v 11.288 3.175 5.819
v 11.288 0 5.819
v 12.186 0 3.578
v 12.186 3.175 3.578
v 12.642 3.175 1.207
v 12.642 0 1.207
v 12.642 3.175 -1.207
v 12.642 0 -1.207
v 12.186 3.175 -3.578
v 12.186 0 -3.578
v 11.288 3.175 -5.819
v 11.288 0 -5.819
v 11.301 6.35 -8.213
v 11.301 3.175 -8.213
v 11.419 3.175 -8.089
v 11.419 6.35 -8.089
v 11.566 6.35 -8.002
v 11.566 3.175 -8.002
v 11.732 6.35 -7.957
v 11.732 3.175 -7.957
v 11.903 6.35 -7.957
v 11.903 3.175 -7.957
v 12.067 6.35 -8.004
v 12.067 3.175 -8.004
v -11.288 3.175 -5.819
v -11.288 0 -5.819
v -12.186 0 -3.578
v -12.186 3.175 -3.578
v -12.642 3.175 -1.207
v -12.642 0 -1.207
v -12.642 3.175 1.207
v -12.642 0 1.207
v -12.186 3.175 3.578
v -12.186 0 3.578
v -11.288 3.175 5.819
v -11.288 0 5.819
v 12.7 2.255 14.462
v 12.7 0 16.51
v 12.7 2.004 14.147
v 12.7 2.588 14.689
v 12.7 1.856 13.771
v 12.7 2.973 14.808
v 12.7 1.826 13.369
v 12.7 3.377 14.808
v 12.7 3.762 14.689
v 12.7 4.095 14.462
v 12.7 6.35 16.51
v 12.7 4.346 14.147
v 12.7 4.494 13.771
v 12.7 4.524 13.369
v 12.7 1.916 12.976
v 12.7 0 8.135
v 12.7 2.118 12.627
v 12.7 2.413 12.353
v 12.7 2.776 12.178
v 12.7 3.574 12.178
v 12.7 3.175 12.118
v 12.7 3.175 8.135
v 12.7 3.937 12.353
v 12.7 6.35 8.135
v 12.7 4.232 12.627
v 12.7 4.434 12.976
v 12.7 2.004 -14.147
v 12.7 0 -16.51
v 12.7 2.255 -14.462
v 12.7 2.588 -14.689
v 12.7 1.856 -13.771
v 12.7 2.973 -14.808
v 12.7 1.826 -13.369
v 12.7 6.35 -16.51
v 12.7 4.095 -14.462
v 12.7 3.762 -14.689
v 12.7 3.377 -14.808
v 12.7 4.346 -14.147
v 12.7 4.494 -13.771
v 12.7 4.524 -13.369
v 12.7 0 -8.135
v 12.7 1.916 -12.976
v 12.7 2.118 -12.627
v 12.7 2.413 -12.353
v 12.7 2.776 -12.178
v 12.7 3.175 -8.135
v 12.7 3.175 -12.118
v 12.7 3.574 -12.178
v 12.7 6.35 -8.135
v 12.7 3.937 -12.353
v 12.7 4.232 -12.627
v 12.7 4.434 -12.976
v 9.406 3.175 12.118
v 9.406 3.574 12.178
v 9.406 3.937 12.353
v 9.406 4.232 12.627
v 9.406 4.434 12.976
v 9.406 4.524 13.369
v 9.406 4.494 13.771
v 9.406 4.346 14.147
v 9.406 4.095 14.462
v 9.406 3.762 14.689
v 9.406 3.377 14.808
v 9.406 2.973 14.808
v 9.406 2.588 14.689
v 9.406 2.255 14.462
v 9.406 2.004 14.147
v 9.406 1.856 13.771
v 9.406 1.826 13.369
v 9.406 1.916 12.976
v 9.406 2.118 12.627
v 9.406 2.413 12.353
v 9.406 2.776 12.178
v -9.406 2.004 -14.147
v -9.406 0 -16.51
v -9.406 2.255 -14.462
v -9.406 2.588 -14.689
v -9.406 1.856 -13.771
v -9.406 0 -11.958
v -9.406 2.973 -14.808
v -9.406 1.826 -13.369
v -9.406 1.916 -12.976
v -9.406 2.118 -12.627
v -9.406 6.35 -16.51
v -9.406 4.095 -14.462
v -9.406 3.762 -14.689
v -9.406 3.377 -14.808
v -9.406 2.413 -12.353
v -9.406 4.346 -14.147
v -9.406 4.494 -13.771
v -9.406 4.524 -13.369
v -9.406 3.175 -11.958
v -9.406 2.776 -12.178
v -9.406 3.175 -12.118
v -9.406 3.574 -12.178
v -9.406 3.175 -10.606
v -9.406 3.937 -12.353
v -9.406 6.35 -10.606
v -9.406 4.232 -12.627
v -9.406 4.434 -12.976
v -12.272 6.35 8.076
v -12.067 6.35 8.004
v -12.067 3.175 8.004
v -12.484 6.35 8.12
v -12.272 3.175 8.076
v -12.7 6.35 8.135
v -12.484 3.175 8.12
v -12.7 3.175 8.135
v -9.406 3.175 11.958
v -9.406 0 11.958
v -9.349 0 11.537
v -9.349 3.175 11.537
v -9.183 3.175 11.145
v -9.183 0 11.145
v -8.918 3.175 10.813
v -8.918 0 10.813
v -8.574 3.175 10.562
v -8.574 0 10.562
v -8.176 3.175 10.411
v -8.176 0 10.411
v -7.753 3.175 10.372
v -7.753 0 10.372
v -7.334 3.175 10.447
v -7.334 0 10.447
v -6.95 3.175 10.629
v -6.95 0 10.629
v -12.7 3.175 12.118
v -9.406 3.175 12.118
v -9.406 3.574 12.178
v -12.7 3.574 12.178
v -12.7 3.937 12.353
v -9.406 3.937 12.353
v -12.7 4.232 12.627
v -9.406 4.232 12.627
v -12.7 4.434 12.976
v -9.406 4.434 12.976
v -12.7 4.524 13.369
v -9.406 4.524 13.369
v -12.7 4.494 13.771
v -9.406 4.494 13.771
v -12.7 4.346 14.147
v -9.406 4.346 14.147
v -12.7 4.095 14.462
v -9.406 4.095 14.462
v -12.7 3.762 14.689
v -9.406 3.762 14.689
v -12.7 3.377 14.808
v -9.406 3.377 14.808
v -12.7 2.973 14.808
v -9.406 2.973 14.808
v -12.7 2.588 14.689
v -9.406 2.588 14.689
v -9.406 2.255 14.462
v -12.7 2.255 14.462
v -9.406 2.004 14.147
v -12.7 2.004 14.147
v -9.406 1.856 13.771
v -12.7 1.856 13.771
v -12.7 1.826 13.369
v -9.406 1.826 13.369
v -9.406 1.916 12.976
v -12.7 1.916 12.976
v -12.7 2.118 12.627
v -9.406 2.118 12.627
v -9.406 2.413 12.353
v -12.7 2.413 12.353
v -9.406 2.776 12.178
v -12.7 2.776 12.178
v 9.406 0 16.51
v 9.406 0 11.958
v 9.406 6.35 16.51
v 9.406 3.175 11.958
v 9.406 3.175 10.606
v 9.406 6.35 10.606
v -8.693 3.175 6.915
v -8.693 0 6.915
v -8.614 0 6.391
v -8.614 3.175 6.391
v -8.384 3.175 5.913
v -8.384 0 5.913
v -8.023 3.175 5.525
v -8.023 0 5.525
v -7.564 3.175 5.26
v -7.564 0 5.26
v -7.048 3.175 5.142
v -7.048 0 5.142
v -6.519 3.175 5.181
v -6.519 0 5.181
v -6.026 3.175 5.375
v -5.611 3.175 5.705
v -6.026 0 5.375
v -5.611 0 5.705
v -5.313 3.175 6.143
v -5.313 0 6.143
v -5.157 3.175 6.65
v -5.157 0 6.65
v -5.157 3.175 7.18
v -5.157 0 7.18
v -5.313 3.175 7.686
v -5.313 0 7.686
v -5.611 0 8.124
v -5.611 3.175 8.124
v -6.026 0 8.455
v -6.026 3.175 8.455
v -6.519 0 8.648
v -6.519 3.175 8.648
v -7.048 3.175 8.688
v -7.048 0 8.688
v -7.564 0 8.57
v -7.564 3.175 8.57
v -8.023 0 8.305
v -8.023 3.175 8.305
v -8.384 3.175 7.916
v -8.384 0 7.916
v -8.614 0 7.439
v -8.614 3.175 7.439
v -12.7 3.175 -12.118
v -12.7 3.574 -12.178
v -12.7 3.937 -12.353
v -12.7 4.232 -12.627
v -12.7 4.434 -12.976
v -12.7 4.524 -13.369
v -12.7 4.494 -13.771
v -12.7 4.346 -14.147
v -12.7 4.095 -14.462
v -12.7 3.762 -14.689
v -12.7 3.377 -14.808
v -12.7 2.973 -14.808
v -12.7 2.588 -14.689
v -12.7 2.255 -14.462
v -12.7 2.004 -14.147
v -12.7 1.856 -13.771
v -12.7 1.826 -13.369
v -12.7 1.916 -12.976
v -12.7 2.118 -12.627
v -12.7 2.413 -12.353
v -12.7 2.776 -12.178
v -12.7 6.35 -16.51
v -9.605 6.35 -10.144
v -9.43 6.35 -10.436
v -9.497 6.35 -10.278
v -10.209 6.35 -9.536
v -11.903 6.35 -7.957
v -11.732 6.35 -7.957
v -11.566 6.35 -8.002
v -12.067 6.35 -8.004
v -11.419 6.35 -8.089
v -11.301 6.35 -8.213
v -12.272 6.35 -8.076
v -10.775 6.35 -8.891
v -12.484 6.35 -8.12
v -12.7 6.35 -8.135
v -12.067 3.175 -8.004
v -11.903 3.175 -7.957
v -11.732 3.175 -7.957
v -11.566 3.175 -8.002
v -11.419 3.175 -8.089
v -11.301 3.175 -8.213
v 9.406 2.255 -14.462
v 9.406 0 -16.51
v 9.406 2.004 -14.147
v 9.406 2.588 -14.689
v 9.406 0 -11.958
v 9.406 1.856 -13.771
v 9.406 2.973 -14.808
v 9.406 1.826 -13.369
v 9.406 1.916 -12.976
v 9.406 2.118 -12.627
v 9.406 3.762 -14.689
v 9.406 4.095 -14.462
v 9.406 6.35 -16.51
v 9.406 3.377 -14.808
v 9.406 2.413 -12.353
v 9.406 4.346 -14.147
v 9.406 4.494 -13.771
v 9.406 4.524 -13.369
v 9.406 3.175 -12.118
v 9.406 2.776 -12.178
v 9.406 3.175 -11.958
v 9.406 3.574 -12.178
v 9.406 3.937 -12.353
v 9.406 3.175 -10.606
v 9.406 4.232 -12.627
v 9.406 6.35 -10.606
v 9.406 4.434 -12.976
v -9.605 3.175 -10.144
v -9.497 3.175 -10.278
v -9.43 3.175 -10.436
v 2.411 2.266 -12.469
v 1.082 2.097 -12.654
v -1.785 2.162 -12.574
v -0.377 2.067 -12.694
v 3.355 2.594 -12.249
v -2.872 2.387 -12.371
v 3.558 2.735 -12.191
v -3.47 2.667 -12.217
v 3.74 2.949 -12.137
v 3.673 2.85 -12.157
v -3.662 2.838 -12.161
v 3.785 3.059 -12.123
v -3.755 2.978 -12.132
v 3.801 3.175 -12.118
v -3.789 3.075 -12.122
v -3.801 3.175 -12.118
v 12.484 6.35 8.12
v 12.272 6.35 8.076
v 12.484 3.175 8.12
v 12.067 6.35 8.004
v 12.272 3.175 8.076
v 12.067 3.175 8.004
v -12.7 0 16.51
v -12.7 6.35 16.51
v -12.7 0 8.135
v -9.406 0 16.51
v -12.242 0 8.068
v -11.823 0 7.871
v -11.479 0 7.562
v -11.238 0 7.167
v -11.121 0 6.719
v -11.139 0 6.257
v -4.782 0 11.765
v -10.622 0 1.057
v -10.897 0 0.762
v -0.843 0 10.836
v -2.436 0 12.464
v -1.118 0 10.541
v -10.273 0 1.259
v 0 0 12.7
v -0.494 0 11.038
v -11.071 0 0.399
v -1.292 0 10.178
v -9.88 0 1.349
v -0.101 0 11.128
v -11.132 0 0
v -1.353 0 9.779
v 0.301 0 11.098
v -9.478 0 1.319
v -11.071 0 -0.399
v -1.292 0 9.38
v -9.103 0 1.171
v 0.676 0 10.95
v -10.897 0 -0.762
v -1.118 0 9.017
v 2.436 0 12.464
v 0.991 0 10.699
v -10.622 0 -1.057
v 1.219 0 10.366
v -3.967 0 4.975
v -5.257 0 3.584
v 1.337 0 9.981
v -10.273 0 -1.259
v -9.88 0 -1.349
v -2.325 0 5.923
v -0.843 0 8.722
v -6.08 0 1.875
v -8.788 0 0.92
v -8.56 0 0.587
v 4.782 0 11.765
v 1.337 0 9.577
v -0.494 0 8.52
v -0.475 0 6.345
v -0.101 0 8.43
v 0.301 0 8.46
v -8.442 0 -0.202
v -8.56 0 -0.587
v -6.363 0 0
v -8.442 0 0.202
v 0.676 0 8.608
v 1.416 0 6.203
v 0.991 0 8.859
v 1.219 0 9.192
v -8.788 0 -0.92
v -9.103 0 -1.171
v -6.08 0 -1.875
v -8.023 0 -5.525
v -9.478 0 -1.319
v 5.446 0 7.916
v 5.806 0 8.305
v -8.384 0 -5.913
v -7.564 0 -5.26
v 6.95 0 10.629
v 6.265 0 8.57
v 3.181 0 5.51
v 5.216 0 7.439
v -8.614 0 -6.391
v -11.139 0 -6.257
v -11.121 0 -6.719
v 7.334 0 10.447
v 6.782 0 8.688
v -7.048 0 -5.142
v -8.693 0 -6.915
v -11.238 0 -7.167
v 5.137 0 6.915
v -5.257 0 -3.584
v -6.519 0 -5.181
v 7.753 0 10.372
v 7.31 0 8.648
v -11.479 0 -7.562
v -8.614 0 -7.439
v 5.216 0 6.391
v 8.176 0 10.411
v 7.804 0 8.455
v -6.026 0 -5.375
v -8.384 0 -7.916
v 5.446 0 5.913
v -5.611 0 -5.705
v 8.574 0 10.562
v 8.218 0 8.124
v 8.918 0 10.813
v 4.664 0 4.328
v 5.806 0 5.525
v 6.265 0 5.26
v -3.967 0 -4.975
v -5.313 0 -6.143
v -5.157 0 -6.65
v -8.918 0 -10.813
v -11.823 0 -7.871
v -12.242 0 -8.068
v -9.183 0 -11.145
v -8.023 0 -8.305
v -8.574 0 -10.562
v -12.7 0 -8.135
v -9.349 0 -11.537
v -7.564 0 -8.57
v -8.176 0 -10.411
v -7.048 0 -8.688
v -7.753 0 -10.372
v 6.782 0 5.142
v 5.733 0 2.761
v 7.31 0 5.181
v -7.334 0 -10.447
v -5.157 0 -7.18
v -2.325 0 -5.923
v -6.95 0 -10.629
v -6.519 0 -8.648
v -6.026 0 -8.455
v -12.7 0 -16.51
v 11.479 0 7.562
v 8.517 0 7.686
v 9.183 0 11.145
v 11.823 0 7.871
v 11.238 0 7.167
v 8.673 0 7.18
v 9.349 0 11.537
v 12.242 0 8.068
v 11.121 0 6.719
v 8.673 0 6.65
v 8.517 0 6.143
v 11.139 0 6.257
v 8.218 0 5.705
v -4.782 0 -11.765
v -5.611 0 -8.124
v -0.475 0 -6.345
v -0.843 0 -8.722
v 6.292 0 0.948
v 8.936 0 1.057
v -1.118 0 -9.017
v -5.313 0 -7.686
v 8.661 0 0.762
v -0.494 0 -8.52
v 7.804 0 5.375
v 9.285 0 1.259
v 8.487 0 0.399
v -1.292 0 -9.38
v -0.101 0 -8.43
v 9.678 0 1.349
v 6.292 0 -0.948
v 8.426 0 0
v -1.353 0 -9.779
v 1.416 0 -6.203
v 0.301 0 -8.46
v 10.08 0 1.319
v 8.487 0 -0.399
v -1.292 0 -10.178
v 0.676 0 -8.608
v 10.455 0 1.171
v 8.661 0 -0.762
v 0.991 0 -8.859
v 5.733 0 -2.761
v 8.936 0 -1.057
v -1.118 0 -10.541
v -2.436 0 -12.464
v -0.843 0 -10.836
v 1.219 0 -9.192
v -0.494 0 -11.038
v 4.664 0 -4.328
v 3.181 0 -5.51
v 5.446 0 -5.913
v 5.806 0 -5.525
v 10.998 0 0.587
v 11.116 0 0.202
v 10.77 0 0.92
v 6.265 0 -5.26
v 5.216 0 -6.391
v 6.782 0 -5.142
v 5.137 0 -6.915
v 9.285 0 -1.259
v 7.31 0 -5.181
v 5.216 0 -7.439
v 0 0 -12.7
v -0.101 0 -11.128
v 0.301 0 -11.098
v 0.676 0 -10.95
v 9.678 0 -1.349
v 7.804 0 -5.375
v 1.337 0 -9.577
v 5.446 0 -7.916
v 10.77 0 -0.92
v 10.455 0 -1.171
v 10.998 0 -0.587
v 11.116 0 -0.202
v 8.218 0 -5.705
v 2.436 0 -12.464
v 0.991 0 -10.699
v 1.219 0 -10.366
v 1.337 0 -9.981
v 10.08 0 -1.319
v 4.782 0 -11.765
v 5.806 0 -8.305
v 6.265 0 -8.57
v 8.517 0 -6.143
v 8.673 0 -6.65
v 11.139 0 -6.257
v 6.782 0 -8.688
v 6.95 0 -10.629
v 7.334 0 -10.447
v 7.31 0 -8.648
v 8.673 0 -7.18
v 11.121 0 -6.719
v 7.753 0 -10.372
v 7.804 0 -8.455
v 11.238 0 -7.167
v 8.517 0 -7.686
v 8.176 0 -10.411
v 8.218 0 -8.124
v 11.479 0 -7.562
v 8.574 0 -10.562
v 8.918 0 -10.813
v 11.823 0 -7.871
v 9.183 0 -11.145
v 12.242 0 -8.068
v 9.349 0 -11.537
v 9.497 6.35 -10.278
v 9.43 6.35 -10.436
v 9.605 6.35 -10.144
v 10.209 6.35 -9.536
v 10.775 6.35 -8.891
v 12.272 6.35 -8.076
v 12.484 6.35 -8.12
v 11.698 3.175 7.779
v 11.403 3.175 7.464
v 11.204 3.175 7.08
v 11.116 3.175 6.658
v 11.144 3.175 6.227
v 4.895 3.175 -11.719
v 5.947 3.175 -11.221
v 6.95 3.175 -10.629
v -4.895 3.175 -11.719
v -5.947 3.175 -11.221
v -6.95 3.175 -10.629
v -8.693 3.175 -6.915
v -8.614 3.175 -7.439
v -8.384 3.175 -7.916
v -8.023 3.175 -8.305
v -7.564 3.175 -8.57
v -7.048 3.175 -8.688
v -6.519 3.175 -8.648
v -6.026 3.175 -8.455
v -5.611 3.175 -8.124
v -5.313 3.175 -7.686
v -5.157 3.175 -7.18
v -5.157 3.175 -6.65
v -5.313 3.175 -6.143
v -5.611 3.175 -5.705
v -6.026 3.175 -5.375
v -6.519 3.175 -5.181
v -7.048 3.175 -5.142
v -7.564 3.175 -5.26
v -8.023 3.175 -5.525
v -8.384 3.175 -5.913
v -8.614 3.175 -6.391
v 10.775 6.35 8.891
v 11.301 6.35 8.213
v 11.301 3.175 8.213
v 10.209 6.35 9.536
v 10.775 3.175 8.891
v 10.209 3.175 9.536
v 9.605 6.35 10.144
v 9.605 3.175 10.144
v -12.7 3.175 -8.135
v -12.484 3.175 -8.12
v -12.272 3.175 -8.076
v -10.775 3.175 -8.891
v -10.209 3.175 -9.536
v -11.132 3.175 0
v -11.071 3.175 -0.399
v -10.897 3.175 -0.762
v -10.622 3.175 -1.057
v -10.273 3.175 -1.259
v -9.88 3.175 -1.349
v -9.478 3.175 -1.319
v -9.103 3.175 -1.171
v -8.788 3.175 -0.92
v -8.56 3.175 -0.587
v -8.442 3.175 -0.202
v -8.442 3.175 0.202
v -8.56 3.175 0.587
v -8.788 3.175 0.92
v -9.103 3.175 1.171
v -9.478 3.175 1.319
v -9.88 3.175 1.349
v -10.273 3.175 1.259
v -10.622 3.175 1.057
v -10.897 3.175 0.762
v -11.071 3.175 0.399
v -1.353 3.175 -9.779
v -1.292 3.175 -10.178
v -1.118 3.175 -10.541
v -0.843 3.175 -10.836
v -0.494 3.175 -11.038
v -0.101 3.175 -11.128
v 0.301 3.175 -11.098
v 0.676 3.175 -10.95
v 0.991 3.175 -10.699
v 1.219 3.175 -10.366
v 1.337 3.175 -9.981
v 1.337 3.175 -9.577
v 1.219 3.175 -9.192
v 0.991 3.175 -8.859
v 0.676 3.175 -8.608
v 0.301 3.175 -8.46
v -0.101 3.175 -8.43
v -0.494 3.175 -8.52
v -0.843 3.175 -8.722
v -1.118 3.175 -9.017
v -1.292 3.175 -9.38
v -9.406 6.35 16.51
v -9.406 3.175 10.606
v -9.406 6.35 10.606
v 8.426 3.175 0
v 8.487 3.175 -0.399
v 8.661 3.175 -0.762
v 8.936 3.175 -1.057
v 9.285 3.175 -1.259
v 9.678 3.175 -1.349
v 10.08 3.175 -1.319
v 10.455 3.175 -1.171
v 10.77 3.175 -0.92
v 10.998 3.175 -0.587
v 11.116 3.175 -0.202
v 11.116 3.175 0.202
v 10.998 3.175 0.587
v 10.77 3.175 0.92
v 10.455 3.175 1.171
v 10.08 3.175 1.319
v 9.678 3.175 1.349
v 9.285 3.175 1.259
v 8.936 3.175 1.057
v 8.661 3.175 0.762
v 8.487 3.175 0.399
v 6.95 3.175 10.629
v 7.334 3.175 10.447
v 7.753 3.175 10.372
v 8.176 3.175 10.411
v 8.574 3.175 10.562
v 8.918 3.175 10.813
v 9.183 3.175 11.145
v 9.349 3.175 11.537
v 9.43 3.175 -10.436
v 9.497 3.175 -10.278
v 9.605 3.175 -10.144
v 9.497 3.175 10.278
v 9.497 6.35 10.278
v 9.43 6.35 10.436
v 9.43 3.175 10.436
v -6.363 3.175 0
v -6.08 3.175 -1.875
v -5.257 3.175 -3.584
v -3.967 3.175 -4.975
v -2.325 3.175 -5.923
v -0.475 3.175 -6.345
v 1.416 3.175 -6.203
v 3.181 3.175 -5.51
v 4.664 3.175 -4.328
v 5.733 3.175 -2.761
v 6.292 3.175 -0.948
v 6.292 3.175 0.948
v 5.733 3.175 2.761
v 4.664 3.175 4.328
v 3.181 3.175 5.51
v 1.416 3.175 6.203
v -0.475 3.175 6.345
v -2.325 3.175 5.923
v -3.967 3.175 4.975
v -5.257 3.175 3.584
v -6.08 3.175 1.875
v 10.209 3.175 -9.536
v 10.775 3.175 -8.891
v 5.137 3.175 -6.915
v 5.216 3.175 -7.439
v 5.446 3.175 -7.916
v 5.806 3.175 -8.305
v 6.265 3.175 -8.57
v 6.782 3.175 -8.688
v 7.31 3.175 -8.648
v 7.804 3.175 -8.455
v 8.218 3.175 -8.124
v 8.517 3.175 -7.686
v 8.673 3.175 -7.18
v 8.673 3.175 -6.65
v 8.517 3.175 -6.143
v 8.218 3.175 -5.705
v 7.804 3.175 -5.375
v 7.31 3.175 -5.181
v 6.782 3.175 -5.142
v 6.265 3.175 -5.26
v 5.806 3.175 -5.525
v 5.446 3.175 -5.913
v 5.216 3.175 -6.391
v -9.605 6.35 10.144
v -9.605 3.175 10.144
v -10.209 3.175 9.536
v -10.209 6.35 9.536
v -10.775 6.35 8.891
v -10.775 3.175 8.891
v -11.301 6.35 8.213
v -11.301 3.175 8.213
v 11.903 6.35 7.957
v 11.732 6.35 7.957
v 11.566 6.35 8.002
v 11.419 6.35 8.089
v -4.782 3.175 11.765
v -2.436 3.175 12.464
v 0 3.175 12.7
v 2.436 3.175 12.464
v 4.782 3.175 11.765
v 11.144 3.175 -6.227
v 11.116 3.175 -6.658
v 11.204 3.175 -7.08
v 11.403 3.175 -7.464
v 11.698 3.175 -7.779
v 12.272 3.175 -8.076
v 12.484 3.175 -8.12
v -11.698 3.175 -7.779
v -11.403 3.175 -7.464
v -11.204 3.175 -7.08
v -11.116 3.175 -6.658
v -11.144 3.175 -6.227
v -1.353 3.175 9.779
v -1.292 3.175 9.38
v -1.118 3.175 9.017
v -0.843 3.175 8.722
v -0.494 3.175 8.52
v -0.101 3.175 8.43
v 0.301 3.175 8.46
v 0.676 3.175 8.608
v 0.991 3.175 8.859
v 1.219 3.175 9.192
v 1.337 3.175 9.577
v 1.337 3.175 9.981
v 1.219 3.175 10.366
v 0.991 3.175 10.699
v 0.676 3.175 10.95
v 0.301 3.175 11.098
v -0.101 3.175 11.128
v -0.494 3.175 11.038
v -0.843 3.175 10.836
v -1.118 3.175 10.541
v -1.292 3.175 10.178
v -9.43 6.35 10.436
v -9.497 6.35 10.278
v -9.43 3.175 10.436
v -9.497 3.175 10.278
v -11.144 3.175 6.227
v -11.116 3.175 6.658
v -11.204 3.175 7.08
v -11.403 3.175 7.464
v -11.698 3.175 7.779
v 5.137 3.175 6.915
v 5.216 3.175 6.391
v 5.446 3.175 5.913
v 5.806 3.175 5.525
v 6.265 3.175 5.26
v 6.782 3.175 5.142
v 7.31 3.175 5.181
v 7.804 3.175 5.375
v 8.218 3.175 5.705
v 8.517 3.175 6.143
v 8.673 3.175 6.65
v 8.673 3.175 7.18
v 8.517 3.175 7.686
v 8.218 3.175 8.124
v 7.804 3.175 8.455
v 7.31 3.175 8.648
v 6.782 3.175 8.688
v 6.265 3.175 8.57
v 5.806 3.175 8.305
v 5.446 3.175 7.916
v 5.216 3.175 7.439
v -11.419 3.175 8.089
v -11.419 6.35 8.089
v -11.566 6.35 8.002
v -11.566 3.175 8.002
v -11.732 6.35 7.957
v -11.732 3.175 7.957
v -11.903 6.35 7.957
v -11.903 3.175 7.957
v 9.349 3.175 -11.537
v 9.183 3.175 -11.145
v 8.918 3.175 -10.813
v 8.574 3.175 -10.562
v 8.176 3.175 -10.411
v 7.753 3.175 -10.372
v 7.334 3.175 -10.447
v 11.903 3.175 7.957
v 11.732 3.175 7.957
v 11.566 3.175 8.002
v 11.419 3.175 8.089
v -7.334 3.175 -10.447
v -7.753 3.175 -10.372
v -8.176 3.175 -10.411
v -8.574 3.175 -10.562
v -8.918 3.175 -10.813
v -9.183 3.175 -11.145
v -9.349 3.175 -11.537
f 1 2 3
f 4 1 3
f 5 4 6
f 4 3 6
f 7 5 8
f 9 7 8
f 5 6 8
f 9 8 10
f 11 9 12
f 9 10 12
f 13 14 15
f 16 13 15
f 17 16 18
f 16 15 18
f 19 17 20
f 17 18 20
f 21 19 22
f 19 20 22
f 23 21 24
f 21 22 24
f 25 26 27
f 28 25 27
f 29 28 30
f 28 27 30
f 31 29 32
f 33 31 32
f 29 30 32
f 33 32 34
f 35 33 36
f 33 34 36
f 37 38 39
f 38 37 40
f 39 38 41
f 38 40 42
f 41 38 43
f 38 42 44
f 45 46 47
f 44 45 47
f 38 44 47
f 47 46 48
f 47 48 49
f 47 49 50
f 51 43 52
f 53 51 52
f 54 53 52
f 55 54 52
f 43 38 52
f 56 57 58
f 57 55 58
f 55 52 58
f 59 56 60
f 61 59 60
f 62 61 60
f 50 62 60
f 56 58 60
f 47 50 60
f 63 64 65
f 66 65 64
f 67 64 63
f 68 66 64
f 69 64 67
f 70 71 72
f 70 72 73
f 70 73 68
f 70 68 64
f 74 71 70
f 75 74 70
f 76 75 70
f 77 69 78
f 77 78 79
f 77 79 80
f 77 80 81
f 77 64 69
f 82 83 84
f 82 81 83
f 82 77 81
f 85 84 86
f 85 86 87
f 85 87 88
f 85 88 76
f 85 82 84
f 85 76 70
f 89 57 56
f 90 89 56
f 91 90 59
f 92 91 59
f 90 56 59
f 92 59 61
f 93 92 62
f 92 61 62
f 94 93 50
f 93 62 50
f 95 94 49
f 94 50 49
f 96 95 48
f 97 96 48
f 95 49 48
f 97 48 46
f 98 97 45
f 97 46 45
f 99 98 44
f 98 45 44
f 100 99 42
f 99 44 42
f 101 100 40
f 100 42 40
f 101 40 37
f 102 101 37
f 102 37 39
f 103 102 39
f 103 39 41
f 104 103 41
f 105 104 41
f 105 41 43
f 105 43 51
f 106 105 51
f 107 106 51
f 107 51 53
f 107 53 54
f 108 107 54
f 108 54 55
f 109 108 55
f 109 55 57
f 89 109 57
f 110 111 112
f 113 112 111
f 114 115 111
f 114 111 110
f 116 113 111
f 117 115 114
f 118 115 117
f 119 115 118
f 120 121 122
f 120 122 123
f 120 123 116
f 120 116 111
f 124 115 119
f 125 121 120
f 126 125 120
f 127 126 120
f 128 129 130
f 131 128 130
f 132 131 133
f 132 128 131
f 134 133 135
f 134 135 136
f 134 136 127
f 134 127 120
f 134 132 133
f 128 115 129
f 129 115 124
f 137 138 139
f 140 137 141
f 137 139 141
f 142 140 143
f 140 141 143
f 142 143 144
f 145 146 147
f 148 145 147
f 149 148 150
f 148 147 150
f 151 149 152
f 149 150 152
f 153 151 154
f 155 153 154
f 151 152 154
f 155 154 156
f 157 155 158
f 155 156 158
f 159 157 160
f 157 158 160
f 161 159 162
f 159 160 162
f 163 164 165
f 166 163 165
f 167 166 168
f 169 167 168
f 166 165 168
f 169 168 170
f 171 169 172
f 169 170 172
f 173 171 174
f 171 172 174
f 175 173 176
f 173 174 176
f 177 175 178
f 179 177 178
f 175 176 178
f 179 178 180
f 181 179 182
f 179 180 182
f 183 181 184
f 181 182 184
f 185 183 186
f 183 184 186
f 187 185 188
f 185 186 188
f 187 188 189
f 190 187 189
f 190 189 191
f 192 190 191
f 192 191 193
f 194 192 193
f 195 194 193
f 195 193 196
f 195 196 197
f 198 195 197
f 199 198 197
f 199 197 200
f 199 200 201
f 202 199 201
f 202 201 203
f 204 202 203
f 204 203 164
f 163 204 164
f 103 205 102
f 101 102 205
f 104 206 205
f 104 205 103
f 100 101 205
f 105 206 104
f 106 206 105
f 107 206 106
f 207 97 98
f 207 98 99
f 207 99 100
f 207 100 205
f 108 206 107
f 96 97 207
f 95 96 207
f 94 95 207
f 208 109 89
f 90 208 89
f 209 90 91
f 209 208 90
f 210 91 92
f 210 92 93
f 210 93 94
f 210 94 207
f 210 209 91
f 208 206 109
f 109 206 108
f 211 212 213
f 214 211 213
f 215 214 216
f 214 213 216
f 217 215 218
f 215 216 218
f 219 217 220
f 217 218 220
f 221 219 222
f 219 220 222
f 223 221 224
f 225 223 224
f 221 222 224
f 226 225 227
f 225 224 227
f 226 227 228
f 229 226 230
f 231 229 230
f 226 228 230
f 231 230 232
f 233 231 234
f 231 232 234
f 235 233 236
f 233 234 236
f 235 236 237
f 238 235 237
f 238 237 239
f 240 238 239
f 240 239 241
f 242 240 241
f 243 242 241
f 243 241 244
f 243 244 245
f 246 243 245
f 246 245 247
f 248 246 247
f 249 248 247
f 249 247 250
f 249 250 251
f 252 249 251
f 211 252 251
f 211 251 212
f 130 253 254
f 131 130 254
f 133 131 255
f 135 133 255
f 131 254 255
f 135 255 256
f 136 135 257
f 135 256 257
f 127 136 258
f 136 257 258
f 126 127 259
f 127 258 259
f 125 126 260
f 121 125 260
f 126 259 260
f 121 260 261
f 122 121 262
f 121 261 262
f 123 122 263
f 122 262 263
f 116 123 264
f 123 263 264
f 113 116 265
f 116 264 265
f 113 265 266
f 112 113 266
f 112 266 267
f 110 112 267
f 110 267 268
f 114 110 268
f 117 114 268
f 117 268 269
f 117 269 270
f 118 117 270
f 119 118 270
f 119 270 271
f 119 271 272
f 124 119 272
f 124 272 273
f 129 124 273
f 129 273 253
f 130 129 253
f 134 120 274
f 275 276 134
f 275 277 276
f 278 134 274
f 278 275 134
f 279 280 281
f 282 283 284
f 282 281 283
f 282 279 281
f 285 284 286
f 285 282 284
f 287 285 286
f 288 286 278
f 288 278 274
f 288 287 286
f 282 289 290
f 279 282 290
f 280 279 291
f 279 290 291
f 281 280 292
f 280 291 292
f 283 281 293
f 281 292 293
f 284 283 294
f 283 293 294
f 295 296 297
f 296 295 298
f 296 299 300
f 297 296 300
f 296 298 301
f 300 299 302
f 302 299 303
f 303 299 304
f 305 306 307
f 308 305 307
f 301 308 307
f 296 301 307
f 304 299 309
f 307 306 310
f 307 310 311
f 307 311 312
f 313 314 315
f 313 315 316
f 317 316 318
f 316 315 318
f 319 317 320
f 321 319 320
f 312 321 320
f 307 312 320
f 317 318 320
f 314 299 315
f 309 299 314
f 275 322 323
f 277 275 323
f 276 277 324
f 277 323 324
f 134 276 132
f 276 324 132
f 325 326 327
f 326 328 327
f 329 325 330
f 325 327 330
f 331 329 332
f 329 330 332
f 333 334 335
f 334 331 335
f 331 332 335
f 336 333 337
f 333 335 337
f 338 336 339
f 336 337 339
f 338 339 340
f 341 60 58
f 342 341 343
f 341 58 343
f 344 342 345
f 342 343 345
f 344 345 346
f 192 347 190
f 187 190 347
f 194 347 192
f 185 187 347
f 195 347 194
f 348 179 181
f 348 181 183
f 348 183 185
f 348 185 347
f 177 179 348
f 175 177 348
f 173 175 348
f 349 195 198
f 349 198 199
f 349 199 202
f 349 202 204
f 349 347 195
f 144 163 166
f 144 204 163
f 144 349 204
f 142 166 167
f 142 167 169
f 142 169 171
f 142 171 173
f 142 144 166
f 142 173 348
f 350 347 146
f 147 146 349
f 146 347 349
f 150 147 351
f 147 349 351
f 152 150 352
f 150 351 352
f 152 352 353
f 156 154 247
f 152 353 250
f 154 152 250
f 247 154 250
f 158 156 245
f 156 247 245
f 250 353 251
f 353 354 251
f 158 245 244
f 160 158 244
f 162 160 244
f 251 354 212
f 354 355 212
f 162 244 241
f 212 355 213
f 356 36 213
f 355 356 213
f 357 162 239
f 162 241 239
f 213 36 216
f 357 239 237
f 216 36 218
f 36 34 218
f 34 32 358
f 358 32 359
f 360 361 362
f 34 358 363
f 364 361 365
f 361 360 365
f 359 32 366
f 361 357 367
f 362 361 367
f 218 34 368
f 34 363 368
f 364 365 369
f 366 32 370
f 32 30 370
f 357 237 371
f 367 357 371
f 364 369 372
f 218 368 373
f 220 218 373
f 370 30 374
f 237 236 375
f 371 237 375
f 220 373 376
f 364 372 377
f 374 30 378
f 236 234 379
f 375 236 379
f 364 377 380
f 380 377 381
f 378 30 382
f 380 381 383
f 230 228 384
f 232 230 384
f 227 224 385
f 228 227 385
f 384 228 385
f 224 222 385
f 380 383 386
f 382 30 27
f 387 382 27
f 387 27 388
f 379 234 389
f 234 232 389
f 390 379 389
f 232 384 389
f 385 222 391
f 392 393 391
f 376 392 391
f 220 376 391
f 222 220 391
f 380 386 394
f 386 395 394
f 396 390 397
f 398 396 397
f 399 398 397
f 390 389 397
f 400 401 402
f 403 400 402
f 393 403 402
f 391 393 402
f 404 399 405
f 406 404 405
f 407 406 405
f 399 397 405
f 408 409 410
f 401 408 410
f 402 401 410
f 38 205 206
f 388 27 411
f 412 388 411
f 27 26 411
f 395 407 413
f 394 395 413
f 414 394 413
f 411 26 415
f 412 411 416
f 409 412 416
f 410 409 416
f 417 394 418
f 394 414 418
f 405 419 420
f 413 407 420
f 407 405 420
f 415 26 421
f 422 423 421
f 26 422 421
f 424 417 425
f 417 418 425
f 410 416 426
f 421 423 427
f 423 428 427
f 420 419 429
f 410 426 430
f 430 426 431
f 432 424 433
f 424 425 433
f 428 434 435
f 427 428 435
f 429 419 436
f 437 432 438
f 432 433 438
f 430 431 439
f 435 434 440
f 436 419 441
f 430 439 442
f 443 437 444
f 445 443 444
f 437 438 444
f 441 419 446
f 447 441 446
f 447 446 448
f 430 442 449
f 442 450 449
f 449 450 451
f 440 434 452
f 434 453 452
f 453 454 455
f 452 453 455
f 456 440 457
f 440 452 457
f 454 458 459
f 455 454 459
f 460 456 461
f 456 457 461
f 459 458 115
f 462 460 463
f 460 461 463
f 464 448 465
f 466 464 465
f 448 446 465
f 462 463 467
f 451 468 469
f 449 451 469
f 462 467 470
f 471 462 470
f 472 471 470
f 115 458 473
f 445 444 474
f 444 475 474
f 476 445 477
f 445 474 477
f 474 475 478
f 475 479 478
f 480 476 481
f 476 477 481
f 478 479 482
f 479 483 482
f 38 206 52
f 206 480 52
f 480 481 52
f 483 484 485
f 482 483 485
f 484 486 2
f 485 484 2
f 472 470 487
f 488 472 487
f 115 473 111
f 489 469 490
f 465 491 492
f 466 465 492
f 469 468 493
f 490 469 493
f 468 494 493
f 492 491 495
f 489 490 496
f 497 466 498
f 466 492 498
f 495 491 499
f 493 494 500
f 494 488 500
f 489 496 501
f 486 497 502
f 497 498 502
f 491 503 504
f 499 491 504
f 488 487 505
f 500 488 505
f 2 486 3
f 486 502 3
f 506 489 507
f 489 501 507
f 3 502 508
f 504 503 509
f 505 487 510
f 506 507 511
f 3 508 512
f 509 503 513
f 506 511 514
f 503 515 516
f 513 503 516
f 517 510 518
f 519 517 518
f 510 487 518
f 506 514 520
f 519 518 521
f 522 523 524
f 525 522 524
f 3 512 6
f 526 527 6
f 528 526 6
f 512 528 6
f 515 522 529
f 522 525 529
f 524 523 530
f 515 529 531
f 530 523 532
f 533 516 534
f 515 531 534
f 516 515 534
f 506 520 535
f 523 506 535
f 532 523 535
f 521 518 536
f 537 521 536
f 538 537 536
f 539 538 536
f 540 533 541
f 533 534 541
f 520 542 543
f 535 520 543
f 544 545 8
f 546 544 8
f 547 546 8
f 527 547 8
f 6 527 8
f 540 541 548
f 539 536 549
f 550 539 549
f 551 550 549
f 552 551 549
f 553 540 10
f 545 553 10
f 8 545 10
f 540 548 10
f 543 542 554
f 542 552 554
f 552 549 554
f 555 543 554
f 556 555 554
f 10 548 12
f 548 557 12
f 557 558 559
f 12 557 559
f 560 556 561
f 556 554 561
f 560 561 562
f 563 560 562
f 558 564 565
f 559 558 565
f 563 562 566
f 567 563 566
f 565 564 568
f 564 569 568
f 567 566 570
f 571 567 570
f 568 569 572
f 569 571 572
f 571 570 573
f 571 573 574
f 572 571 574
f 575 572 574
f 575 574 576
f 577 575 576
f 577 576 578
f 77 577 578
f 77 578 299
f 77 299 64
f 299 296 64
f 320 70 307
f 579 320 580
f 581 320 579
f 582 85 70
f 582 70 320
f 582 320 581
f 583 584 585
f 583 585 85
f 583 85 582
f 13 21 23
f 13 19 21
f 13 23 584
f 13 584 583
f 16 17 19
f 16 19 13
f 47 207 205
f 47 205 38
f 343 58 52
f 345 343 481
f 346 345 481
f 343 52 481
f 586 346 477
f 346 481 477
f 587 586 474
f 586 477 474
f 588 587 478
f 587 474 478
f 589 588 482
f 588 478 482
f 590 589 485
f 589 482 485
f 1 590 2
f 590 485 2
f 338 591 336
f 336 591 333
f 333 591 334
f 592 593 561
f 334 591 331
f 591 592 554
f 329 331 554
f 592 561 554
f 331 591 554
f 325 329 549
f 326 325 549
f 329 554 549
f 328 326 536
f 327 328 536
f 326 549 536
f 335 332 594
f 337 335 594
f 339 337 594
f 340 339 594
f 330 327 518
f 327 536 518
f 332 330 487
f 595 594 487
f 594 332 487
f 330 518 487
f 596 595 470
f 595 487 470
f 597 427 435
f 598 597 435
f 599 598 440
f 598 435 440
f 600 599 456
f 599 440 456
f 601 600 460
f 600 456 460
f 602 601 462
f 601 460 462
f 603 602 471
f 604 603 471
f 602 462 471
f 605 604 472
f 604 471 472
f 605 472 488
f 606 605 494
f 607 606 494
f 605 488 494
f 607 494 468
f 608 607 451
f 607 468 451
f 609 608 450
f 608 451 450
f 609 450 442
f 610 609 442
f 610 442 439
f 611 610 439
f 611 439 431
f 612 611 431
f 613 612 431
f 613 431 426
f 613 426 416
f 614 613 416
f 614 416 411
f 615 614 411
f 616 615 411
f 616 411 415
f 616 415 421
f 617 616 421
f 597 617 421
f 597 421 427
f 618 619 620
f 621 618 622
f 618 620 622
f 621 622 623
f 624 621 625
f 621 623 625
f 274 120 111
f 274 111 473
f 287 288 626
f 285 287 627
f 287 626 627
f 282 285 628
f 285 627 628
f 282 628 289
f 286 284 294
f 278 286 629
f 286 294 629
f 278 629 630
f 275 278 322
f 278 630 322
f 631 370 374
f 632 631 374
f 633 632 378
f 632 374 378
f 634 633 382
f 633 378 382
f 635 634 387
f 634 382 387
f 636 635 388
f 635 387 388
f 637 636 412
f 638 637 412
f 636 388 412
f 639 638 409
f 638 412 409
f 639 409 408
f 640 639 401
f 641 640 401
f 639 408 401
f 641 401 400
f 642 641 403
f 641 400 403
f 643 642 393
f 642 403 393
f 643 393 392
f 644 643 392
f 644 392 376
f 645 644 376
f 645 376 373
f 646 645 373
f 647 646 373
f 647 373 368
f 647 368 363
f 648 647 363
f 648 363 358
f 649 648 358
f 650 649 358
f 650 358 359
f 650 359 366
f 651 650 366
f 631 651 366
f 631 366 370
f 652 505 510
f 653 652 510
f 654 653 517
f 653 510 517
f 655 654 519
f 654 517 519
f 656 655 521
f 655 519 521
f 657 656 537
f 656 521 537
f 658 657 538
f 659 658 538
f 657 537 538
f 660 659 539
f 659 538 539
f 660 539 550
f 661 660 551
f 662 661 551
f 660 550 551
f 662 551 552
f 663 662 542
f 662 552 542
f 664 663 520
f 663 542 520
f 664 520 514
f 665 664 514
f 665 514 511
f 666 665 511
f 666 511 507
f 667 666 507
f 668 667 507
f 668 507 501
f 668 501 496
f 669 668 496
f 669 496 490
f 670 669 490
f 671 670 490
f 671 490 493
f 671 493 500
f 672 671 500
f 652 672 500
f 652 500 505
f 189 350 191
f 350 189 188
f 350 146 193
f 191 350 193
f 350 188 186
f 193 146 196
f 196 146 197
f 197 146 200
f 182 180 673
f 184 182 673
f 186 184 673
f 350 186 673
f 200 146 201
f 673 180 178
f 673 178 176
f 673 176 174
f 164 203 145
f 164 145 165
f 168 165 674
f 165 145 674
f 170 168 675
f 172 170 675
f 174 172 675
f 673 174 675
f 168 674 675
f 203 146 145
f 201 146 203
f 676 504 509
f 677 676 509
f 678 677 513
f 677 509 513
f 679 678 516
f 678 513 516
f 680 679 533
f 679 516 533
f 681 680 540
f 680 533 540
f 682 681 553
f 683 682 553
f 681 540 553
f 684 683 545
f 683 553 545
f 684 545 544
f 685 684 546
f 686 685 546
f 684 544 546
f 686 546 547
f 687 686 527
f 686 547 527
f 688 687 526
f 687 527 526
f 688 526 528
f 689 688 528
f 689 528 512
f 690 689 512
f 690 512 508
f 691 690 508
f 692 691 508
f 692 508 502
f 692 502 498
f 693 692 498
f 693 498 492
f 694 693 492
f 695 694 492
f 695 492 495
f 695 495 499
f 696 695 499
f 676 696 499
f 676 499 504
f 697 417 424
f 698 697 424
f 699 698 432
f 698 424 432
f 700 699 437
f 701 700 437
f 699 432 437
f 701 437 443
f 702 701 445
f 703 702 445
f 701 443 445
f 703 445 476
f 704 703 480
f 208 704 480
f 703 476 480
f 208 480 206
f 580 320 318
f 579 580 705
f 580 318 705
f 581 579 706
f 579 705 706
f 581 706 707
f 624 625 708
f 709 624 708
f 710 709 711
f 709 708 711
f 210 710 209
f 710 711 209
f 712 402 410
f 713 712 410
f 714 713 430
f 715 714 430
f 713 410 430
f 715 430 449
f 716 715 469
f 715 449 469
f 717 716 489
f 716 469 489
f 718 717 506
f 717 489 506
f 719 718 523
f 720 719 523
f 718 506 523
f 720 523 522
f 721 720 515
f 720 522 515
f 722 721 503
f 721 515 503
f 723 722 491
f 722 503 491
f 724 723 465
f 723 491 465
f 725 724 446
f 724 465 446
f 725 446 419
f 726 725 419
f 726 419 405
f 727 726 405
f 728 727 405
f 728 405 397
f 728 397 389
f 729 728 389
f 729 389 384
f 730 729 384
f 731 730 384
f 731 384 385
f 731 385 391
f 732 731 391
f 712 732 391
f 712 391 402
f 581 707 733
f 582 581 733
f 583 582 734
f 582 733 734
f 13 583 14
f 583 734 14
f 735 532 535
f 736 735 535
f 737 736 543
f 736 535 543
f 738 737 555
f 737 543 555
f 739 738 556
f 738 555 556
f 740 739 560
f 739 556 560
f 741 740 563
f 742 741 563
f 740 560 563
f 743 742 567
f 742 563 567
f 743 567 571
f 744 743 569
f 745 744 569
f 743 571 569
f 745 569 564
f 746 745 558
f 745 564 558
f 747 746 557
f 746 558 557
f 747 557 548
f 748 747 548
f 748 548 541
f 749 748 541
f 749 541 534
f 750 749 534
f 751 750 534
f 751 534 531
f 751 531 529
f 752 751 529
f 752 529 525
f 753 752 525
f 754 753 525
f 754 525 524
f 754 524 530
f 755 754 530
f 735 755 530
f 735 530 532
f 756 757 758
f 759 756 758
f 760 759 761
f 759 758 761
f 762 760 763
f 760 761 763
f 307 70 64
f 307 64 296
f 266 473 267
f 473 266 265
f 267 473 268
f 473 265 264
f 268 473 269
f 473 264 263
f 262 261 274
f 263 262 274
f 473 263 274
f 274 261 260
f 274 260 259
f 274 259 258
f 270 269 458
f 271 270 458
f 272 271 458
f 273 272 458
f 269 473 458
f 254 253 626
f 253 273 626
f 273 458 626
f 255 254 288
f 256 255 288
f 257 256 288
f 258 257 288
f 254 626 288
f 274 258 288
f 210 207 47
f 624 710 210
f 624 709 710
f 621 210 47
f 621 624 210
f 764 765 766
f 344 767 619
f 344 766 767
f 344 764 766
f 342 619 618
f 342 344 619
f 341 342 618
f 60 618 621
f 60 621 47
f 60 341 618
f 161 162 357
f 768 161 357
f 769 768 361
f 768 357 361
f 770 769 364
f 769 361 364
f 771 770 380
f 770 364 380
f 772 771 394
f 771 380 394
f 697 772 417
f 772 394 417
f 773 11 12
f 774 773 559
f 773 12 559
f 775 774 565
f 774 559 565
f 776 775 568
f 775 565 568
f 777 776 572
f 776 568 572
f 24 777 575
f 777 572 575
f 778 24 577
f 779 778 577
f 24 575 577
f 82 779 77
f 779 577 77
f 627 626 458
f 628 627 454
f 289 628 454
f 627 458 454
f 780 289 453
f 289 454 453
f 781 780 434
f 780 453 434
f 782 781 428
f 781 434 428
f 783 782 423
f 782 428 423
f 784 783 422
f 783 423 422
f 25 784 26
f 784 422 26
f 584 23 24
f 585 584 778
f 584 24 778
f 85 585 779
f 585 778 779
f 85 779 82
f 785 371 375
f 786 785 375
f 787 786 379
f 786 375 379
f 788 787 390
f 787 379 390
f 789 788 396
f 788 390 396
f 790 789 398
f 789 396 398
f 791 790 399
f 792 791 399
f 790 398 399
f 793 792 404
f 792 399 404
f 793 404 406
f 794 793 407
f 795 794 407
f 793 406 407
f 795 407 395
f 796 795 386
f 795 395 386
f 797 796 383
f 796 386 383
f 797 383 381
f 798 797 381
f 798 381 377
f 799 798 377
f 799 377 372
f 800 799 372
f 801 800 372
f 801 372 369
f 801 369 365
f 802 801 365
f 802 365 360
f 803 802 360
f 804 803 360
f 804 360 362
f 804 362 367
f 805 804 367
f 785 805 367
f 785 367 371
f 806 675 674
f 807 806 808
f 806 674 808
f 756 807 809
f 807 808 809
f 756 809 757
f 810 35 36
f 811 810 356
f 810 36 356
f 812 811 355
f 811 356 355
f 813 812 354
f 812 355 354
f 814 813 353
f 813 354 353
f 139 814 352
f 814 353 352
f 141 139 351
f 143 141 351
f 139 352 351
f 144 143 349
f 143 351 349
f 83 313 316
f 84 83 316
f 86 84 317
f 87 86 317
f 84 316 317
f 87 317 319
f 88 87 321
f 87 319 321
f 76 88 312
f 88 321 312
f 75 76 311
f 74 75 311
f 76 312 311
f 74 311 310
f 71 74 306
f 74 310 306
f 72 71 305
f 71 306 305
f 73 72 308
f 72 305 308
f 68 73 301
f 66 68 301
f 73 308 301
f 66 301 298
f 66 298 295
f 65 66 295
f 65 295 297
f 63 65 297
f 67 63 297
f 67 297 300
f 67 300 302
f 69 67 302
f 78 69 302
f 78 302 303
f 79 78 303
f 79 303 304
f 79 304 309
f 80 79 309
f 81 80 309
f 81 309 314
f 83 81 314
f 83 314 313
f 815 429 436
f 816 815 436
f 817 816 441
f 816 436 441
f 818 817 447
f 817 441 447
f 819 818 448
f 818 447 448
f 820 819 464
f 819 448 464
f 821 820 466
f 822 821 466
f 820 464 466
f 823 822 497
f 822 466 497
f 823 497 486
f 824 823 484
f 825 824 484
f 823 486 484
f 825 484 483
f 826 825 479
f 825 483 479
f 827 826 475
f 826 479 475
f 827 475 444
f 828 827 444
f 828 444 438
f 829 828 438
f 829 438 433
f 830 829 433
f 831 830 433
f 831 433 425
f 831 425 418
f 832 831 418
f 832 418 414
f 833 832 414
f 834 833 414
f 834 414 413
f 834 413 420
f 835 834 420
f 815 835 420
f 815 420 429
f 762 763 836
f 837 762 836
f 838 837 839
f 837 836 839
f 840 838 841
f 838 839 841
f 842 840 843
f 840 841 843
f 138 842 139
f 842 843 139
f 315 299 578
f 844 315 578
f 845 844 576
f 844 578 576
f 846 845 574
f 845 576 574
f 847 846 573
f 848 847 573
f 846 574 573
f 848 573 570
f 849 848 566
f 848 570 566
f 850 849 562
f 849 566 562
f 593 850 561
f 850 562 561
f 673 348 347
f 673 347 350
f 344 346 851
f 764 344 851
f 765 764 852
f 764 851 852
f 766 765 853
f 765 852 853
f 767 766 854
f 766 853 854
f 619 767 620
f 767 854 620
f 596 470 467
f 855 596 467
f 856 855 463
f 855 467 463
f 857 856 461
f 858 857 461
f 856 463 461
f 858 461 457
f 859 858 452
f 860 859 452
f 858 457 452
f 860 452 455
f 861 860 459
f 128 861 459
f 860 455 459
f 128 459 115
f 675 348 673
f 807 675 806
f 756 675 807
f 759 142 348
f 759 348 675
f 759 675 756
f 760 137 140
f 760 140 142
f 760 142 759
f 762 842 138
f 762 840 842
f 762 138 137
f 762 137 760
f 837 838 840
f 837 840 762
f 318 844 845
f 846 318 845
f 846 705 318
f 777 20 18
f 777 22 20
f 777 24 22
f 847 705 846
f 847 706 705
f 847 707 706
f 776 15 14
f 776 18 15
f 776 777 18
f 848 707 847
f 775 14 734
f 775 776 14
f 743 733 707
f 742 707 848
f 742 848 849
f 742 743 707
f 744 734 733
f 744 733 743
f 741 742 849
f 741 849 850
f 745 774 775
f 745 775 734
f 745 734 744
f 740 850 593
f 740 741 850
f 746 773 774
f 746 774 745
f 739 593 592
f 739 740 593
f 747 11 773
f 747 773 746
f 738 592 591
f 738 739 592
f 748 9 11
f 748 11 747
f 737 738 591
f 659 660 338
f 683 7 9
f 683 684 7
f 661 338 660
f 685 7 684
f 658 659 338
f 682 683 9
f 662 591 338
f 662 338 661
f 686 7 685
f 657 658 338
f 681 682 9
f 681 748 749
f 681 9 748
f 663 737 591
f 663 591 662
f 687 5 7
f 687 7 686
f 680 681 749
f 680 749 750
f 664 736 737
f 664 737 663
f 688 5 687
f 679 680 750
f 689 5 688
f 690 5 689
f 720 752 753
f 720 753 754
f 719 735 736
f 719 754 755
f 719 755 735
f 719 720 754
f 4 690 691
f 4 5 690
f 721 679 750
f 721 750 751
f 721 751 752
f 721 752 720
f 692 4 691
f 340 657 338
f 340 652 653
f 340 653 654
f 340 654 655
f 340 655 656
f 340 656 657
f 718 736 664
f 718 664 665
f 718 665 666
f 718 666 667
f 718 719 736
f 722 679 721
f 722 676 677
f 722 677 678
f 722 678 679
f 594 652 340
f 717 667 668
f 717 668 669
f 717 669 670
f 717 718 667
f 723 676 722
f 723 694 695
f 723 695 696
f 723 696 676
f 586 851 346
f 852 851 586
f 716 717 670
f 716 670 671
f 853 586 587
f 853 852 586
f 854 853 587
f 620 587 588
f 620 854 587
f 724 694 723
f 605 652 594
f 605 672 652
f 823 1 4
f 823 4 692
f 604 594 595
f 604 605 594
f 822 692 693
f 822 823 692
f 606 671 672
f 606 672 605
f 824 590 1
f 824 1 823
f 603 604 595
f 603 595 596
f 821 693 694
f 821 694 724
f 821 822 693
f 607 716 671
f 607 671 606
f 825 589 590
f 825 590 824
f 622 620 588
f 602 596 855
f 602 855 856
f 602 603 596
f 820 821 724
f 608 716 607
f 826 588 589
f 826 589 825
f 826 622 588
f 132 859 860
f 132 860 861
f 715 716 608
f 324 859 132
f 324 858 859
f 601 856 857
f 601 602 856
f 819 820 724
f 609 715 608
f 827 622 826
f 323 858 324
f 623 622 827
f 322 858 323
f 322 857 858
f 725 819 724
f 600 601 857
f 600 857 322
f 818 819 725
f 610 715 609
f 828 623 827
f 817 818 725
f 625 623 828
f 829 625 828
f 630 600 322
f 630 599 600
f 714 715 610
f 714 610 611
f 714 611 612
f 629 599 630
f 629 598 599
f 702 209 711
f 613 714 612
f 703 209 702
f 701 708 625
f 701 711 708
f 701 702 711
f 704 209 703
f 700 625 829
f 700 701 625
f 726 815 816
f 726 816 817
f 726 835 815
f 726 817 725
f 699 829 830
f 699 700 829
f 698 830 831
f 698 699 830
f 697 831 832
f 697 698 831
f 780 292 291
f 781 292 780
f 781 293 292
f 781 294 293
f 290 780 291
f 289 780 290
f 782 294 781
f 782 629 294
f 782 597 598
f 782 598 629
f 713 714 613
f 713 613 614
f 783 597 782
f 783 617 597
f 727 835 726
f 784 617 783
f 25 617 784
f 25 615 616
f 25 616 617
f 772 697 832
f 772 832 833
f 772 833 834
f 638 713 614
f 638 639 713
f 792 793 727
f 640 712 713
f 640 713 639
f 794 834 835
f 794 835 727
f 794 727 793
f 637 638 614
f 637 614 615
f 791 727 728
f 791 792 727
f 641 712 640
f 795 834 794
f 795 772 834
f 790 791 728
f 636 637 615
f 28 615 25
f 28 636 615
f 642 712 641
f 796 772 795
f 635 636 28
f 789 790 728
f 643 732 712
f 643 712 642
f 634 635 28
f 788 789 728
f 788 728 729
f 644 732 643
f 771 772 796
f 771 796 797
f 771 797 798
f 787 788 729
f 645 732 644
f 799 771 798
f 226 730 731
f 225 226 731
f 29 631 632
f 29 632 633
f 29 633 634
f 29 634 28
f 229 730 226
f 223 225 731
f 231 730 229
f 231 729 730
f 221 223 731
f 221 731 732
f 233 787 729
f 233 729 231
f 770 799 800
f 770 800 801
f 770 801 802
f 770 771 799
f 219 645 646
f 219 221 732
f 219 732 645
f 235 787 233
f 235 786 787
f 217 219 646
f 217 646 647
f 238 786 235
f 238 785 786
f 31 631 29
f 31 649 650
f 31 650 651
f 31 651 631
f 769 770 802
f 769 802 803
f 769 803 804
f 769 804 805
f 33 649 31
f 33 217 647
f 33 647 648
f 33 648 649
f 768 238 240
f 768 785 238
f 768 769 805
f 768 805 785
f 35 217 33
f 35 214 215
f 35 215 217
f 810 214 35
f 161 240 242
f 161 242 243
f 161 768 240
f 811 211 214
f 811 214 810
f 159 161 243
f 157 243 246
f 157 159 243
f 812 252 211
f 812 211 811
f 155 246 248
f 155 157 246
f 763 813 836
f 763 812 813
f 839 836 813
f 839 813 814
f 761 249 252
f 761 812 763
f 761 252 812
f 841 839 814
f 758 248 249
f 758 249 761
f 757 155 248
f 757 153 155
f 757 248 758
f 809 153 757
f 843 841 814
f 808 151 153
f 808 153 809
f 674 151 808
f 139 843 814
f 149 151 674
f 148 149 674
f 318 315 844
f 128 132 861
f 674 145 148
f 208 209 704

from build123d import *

# Parameters (mm, degrees)
CUT_EXTRUDE1_START         = -6.35
CUT_EXTRUDE1_DEPTH         = 3.175
CUT_EXTRUDE1_START_2       = -3.175
CUT_EXTRUDE1_2_DEPTH       = 3.175
SKETCH2_W                  = 3.293618
SKETCH2_H                  = 6.35
BOSS_EXTRUDE1_DEPTH        = 4.551833731
SKETCH3_W                  = 3.293618
SKETCH3_H                  = 6.35
BOSS_EXTRUDE2_DEPTH        = 4.551833731
SKETCH4_W                  = 3.293618
SKETCH4_H                  = 6.35
BOSS_EXTRUDE3_DEPTH        = 4.551833731
SKETCH5_W                  = 3.293618
SKETCH5_H                  = 6.35
BOSS_EXTRUDE4_DEPTH        = 4.551833731
HOLE1_D                    = 12.7254
M2_5_CLEARANCE_HOLE1_D     = 2.7051
M3_CLEARANCE_HOLE1_D       = 3.556
M2_5_CLEARANCE_HOLE2_D     = 2.7051
M2_5_CLEARANCE_HOLE2_DEPTH = 3.293618
M2_5_CLEARANCE_HOLE3_D     = 2.7051
M2_5_CLEARANCE_HOLE3_DEPTH = 3.293618
M2_5_CLEARANCE_HOLE4_D     = 2.7051
M2_5_CLEARANCE_HOLE4_DEPTH = 25.4
M2_5_CLEARANCE_HOLE5_D     = 2.7051
M2_5_CLEARANCE_HOLE5_DEPTH = 3.293618
FILLET1_R                  = 0.635


with BuildPart() as part:
    # Cut-Extrude1: read off the stored shape, not the designer's step
    # Cut-Extrude1 outline → Cut-Extrude1 (new body)
    with BuildSketch(Plane(origin=(0, 6.35, 0), x_dir=(-1, 0, 0), z_dir=(0, 1, 0)).offset(CUT_EXTRUDE1_START)):
        with BuildLine():
            ThreePointArc((-12.7, 8.135112), (-11.343887812, 7.373541875), (-11.288347253, 5.819210969))
            ThreePointArc((-11.288347253, 5.819210969), (-12.7, 0), (-11.288347253, -5.819210969))
            ThreePointArc((-11.288347253, -5.819210969), (-11.343887812, -7.373541875), (-12.7, -8.135112))
            Line((-12.7, -8.135112), (-12.7, -11.958166269))
            Line((-12.7, -11.958166269), (-9.406382, -11.958166269))
            ThreePointArc((-9.406382, -11.958166269), (-8.574193969, -10.561863981), (-6.950117333, -10.629481128))
            ThreePointArc((-6.950117333, -10.629481128), (0, -12.7), (6.950117333, -10.629481128))
            ThreePointArc((6.950117333, -10.629481128), (8.574193969, -10.561863981), (9.406382, -11.958166269))
            Line((9.406382, -11.958166269), (12.7, -11.958166269))
            Line((12.7, -11.958166269), (12.7, -8.135112))
            ThreePointArc((12.7, -8.135112), (11.343887812, -7.373541875), (11.288347253, -5.819210969))
            ThreePointArc((11.288347253, -5.819210969), (12.7, 0), (11.288347253, 5.819210969))
            ThreePointArc((11.288347253, 5.819210969), (11.343887812, 7.373541875), (12.7, 8.135112))
            Line((12.7, 8.135112), (12.7, 11.958166269))
            Line((12.7, 11.958166269), (9.406382, 11.958166269))
            ThreePointArc((9.406382, 11.958166269), (8.574193969, 10.561863981), (6.950117333, 10.629481128))
            ThreePointArc((6.950117333, 10.629481128), (0, 12.7), (-6.950117333, 10.629481128))
            ThreePointArc((-6.950117333, 10.629481128), (-8.574193969, 10.561863981), (-9.406382, 11.958166269))
            Line((-9.406382, 11.958166269), (-12.7, 11.958166269))
            Line((-12.7, 11.958166269), (-12.7, 8.135112))
        make_face()
    extrude(amount=CUT_EXTRUDE1_DEPTH)

    # Cut-Extrude1 2 outline → Cut-Extrude1 2 (add)
    with BuildSketch(Plane(origin=(0, 6.35, 0), x_dir=(-1, 0, 0), z_dir=(0, 1, 0)).offset(CUT_EXTRUDE1_START_2)):
        with BuildLine():
            Line((-9.406382, 10.328643554), (-9.406382, 11.958166269))
            Line((-9.406382, 11.958166269), (-12.7, 11.958166269))
            Line((-12.7, 11.958166269), (-12.7, 8.135112))
            ThreePointArc((-12.7, 8.135112), (-12.131266538, 8.02978706), (-11.637967358, 7.727782073))
            ThreePointArc((-11.637967358, 7.727782073), (-10.602229958, 9.096901665), (-9.406382, 10.328643554))
        make_face()
        with BuildLine():
            Line((12.7, 11.958166269), (9.406382, 11.958166269))
            Line((9.406382, 11.958166269), (9.406382, 10.328643554))
            ThreePointArc((9.406382, 10.328643554), (10.602229958, 9.096901665), (11.637967358, 7.727782073))
            ThreePointArc((11.637967358, 7.727782073), (12.131266538, 8.02978706), (12.7, 8.135112))
            Line((12.7, 8.135112), (12.7, 11.958166269))
        make_face()
        with BuildLine():
            ThreePointArc((-9.406382, -10.328643554), (-10.602229958, -9.096901665), (-11.637967358, -7.727782073))
            ThreePointArc((-11.637967358, -7.727782073), (-12.131266538, -8.02978706), (-12.7, -8.135112))
            Line((-12.7, -8.135112), (-12.7, -11.958166269))
            Line((-12.7, -11.958166269), (-9.406382, -11.958166269))
            Line((-9.406382, -11.958166269), (-9.406382, -10.328643554))
        make_face()
        with BuildLine():
            ThreePointArc((12.7, -8.135112), (12.131266538, -8.02978706), (11.637967358, -7.727782073))
            ThreePointArc((11.637967358, -7.727782073), (10.602229958, -9.096901665), (9.406382, -10.328643554))
            Line((9.406382, -10.328643554), (9.406382, -11.958166269))
            Line((9.406382, -11.958166269), (12.7, -11.958166269))
            Line((12.7, -11.958166269), (12.7, -8.135112))
        make_face()
    extrude(amount=CUT_EXTRUDE1_2_DEPTH)

    # Sketch2 → Boss-Extrude1 (add)
    with BuildSketch(Plane(origin=(0, 0, -11.958166269), x_dir=(-1, 0, 0), z_dir=(0, 0, -1))):
        with Locations((11.053191, 3.175)):
            Rectangle(SKETCH2_W, SKETCH2_H)
    extrude(amount=BOSS_EXTRUDE1_DEPTH)

    # Sketch3 → Boss-Extrude2 (add)
    with BuildSketch(Plane(origin=(0, 0, -11.958166269), x_dir=(-1, 0, 0), z_dir=(0, 0, -1))):
        with Locations((-11.053191, 3.175)):
            Rectangle(SKETCH3_W, SKETCH3_H)
    extrude(amount=BOSS_EXTRUDE2_DEPTH)

    # Sketch4 → Boss-Extrude3 (add)
    with BuildSketch(Plane.XY.offset(11.958166269)):
        with Locations((11.053191, 3.175)):
            Rectangle(SKETCH4_W, SKETCH4_H)
    extrude(amount=BOSS_EXTRUDE3_DEPTH)

    # Sketch5 → Boss-Extrude4 (add)
    with BuildSketch(Plane.XY.offset(11.958166269)):
        with Locations((-11.053191, 3.175)):
            Rectangle(SKETCH5_W, SKETCH5_H)
    extrude(amount=BOSS_EXTRUDE4_DEPTH)

    # Hole1 (through all)
    with Locations(Plane(origin=(0, 3.175, 0), x_dir=(1, 0, 0), z_dir=(0, 1, 0))):
        with Locations((0, 0)):
            Hole(HOLE1_D / 2)

    # M2.5 Clearance Hole1 (through all)
    with Locations(Plane(origin=(0, 3.175, 0), x_dir=(1, 0, 0), z_dir=(0, 1, 0))):
        with Locations((0, -9.779), (-9.779, 0), (0, 9.779), (9.779, 0)):
            Hole(M2_5_CLEARANCE_HOLE1_D / 2)

    # M3 Clearance Hole1 (through all)
    with Locations(Plane(origin=(0, 3.175, 0), x_dir=(1, 0, 0), z_dir=(0, 1, 0))):
        with Locations((-6.914797213, -6.914797213), (-6.914797213, 6.914797213), (6.914797213, 6.914797213), (6.914797213, -6.914797213)):
            Hole(M3_CLEARANCE_HOLE1_D / 2)

    # M2.5 Clearance Hole2
    with Locations(Plane.ZY.offset(12.7)):
        with Locations((13.470384182, 3.175)):
            Hole(M2_5_CLEARANCE_HOLE2_D / 2, depth=M2_5_CLEARANCE_HOLE2_DEPTH)

    # M2.5 Clearance Hole3
    with Locations(Plane(origin=(-9.406382, 0, 0), x_dir=(0, 0, -1), z_dir=(1, 0, 0))):
        with Locations((13.470384182, 3.175)):
            Hole(M2_5_CLEARANCE_HOLE3_D / 2, depth=M2_5_CLEARANCE_HOLE3_DEPTH)

    # M2.5 Clearance Hole4
    with Locations(Plane(origin=(12.7, 0, 0), x_dir=(0, 0, -1), z_dir=(1, 0, 0))):
        with Locations((13.470384182, 3.175)):
            Hole(M2_5_CLEARANCE_HOLE4_D / 2, depth=M2_5_CLEARANCE_HOLE4_DEPTH)

    # M2.5 Clearance Hole5
    with Locations(Plane.ZY.offset(-9.406382)):
        with Locations((13.470384182, 3.175)):
            Hole(M2_5_CLEARANCE_HOLE5_D / 2, depth=M2_5_CLEARANCE_HOLE5_DEPTH)

    # Fillet1
    # the kernel refuses this fillet: 0.635 mm, written as the material it takes off along each edge
    with BuildSketch(Plane(origin=(-9.406382, 3.175, 10.328643554), x_dir=(0, 0, 1), z_dir=(0, 1, 0)), Plane(origin=(9.406382, 3.175, -10.328643554), x_dir=(0, 0, -1), z_dir=(0, 1, 0))) as fillet1_piece_1:
        with BuildLine():
            CenterArc((0.276858439, -0.635), FILLET1_R, 90, 46.565062077)
            ThreePointArc((-0.184250343, -0.198418174), (-0.091644431, -0.0996555), (0, 0))
            Line((0, 0), (0.276858439, 0))
        make_face()
    extrude(amount=3.867146097, mode=Mode.SUBTRACT)
    with BuildSketch(Plane(origin=(-11.637967358, 3.175, -7.727782073), x_dir=(0.5706588735868443, 0, -0.8211872198205438), z_dir=(0, 1, 0)), Plane(origin=(11.637967358, 3.175, 7.727782073), x_dir=(-0.5706588735868443, 0, 0.8211872198205438), z_dir=(0, 1, 0))) as fillet1_piece_2:
        with BuildLine():
            CenterArc((0.604132084, 0.634858067), FILLET1_R, 191.325534433, 77.463029076)
            ThreePointArc((-0.018502711, 0.51015477), (0.011380109, 0.255825664), (0, 0))
            ThreePointArc((0, 0), (0.295353463, 0.003122527), (0.590706926, 0))
        make_face()
    extrude(amount=4.651767316, mode=Mode.SUBTRACT)
    with BuildSketch(Plane(origin=(-9.406382, 3.175, -10.328643554), x_dir=(0, 0, -1), z_dir=(0, 1, 0)), Plane(origin=(9.406382, 3.175, 10.328643554), x_dir=(0, 0, 1), z_dir=(0, 1, 0))) as fillet1_piece_3:
        with BuildLine():
            CenterArc((0.276858439, 0.635), FILLET1_R, 223.434937923, 46.565062077)
            ThreePointArc((-0.184250343, 0.198418174), (-0.091644431, 0.0996555), (0, 0))
            Line((0, 0), (0.276858439, 0))
        make_face()
    extrude(amount=3.867146097, mode=Mode.SUBTRACT)
    with BuildSketch(Plane(origin=(-11.637967358, 3.175, 7.727782073), x_dir=(0.5706588735868457, 0, 0.8211872198205425), z_dir=(0, 1, 0)), Plane(origin=(11.637967358, 3.175, -7.727782073), x_dir=(-0.5706588735868457, 0, -0.8211872198205425), z_dir=(0, 1, 0))) as fillet1_piece_4:
        with BuildLine():
            CenterArc((0.604132084, -0.634858067), FILLET1_R, 91.211436491, 77.463029076)
            ThreePointArc((-0.018502711, -0.51015477), (0.011380109, -0.255825664), (0, 0))
            ThreePointArc((0, 0), (0.295353463, -0.003122527), (0.590706926, 0))
        make_face()
    extrude(amount=4.651767316, mode=Mode.SUBTRACT)


solid = part.part
